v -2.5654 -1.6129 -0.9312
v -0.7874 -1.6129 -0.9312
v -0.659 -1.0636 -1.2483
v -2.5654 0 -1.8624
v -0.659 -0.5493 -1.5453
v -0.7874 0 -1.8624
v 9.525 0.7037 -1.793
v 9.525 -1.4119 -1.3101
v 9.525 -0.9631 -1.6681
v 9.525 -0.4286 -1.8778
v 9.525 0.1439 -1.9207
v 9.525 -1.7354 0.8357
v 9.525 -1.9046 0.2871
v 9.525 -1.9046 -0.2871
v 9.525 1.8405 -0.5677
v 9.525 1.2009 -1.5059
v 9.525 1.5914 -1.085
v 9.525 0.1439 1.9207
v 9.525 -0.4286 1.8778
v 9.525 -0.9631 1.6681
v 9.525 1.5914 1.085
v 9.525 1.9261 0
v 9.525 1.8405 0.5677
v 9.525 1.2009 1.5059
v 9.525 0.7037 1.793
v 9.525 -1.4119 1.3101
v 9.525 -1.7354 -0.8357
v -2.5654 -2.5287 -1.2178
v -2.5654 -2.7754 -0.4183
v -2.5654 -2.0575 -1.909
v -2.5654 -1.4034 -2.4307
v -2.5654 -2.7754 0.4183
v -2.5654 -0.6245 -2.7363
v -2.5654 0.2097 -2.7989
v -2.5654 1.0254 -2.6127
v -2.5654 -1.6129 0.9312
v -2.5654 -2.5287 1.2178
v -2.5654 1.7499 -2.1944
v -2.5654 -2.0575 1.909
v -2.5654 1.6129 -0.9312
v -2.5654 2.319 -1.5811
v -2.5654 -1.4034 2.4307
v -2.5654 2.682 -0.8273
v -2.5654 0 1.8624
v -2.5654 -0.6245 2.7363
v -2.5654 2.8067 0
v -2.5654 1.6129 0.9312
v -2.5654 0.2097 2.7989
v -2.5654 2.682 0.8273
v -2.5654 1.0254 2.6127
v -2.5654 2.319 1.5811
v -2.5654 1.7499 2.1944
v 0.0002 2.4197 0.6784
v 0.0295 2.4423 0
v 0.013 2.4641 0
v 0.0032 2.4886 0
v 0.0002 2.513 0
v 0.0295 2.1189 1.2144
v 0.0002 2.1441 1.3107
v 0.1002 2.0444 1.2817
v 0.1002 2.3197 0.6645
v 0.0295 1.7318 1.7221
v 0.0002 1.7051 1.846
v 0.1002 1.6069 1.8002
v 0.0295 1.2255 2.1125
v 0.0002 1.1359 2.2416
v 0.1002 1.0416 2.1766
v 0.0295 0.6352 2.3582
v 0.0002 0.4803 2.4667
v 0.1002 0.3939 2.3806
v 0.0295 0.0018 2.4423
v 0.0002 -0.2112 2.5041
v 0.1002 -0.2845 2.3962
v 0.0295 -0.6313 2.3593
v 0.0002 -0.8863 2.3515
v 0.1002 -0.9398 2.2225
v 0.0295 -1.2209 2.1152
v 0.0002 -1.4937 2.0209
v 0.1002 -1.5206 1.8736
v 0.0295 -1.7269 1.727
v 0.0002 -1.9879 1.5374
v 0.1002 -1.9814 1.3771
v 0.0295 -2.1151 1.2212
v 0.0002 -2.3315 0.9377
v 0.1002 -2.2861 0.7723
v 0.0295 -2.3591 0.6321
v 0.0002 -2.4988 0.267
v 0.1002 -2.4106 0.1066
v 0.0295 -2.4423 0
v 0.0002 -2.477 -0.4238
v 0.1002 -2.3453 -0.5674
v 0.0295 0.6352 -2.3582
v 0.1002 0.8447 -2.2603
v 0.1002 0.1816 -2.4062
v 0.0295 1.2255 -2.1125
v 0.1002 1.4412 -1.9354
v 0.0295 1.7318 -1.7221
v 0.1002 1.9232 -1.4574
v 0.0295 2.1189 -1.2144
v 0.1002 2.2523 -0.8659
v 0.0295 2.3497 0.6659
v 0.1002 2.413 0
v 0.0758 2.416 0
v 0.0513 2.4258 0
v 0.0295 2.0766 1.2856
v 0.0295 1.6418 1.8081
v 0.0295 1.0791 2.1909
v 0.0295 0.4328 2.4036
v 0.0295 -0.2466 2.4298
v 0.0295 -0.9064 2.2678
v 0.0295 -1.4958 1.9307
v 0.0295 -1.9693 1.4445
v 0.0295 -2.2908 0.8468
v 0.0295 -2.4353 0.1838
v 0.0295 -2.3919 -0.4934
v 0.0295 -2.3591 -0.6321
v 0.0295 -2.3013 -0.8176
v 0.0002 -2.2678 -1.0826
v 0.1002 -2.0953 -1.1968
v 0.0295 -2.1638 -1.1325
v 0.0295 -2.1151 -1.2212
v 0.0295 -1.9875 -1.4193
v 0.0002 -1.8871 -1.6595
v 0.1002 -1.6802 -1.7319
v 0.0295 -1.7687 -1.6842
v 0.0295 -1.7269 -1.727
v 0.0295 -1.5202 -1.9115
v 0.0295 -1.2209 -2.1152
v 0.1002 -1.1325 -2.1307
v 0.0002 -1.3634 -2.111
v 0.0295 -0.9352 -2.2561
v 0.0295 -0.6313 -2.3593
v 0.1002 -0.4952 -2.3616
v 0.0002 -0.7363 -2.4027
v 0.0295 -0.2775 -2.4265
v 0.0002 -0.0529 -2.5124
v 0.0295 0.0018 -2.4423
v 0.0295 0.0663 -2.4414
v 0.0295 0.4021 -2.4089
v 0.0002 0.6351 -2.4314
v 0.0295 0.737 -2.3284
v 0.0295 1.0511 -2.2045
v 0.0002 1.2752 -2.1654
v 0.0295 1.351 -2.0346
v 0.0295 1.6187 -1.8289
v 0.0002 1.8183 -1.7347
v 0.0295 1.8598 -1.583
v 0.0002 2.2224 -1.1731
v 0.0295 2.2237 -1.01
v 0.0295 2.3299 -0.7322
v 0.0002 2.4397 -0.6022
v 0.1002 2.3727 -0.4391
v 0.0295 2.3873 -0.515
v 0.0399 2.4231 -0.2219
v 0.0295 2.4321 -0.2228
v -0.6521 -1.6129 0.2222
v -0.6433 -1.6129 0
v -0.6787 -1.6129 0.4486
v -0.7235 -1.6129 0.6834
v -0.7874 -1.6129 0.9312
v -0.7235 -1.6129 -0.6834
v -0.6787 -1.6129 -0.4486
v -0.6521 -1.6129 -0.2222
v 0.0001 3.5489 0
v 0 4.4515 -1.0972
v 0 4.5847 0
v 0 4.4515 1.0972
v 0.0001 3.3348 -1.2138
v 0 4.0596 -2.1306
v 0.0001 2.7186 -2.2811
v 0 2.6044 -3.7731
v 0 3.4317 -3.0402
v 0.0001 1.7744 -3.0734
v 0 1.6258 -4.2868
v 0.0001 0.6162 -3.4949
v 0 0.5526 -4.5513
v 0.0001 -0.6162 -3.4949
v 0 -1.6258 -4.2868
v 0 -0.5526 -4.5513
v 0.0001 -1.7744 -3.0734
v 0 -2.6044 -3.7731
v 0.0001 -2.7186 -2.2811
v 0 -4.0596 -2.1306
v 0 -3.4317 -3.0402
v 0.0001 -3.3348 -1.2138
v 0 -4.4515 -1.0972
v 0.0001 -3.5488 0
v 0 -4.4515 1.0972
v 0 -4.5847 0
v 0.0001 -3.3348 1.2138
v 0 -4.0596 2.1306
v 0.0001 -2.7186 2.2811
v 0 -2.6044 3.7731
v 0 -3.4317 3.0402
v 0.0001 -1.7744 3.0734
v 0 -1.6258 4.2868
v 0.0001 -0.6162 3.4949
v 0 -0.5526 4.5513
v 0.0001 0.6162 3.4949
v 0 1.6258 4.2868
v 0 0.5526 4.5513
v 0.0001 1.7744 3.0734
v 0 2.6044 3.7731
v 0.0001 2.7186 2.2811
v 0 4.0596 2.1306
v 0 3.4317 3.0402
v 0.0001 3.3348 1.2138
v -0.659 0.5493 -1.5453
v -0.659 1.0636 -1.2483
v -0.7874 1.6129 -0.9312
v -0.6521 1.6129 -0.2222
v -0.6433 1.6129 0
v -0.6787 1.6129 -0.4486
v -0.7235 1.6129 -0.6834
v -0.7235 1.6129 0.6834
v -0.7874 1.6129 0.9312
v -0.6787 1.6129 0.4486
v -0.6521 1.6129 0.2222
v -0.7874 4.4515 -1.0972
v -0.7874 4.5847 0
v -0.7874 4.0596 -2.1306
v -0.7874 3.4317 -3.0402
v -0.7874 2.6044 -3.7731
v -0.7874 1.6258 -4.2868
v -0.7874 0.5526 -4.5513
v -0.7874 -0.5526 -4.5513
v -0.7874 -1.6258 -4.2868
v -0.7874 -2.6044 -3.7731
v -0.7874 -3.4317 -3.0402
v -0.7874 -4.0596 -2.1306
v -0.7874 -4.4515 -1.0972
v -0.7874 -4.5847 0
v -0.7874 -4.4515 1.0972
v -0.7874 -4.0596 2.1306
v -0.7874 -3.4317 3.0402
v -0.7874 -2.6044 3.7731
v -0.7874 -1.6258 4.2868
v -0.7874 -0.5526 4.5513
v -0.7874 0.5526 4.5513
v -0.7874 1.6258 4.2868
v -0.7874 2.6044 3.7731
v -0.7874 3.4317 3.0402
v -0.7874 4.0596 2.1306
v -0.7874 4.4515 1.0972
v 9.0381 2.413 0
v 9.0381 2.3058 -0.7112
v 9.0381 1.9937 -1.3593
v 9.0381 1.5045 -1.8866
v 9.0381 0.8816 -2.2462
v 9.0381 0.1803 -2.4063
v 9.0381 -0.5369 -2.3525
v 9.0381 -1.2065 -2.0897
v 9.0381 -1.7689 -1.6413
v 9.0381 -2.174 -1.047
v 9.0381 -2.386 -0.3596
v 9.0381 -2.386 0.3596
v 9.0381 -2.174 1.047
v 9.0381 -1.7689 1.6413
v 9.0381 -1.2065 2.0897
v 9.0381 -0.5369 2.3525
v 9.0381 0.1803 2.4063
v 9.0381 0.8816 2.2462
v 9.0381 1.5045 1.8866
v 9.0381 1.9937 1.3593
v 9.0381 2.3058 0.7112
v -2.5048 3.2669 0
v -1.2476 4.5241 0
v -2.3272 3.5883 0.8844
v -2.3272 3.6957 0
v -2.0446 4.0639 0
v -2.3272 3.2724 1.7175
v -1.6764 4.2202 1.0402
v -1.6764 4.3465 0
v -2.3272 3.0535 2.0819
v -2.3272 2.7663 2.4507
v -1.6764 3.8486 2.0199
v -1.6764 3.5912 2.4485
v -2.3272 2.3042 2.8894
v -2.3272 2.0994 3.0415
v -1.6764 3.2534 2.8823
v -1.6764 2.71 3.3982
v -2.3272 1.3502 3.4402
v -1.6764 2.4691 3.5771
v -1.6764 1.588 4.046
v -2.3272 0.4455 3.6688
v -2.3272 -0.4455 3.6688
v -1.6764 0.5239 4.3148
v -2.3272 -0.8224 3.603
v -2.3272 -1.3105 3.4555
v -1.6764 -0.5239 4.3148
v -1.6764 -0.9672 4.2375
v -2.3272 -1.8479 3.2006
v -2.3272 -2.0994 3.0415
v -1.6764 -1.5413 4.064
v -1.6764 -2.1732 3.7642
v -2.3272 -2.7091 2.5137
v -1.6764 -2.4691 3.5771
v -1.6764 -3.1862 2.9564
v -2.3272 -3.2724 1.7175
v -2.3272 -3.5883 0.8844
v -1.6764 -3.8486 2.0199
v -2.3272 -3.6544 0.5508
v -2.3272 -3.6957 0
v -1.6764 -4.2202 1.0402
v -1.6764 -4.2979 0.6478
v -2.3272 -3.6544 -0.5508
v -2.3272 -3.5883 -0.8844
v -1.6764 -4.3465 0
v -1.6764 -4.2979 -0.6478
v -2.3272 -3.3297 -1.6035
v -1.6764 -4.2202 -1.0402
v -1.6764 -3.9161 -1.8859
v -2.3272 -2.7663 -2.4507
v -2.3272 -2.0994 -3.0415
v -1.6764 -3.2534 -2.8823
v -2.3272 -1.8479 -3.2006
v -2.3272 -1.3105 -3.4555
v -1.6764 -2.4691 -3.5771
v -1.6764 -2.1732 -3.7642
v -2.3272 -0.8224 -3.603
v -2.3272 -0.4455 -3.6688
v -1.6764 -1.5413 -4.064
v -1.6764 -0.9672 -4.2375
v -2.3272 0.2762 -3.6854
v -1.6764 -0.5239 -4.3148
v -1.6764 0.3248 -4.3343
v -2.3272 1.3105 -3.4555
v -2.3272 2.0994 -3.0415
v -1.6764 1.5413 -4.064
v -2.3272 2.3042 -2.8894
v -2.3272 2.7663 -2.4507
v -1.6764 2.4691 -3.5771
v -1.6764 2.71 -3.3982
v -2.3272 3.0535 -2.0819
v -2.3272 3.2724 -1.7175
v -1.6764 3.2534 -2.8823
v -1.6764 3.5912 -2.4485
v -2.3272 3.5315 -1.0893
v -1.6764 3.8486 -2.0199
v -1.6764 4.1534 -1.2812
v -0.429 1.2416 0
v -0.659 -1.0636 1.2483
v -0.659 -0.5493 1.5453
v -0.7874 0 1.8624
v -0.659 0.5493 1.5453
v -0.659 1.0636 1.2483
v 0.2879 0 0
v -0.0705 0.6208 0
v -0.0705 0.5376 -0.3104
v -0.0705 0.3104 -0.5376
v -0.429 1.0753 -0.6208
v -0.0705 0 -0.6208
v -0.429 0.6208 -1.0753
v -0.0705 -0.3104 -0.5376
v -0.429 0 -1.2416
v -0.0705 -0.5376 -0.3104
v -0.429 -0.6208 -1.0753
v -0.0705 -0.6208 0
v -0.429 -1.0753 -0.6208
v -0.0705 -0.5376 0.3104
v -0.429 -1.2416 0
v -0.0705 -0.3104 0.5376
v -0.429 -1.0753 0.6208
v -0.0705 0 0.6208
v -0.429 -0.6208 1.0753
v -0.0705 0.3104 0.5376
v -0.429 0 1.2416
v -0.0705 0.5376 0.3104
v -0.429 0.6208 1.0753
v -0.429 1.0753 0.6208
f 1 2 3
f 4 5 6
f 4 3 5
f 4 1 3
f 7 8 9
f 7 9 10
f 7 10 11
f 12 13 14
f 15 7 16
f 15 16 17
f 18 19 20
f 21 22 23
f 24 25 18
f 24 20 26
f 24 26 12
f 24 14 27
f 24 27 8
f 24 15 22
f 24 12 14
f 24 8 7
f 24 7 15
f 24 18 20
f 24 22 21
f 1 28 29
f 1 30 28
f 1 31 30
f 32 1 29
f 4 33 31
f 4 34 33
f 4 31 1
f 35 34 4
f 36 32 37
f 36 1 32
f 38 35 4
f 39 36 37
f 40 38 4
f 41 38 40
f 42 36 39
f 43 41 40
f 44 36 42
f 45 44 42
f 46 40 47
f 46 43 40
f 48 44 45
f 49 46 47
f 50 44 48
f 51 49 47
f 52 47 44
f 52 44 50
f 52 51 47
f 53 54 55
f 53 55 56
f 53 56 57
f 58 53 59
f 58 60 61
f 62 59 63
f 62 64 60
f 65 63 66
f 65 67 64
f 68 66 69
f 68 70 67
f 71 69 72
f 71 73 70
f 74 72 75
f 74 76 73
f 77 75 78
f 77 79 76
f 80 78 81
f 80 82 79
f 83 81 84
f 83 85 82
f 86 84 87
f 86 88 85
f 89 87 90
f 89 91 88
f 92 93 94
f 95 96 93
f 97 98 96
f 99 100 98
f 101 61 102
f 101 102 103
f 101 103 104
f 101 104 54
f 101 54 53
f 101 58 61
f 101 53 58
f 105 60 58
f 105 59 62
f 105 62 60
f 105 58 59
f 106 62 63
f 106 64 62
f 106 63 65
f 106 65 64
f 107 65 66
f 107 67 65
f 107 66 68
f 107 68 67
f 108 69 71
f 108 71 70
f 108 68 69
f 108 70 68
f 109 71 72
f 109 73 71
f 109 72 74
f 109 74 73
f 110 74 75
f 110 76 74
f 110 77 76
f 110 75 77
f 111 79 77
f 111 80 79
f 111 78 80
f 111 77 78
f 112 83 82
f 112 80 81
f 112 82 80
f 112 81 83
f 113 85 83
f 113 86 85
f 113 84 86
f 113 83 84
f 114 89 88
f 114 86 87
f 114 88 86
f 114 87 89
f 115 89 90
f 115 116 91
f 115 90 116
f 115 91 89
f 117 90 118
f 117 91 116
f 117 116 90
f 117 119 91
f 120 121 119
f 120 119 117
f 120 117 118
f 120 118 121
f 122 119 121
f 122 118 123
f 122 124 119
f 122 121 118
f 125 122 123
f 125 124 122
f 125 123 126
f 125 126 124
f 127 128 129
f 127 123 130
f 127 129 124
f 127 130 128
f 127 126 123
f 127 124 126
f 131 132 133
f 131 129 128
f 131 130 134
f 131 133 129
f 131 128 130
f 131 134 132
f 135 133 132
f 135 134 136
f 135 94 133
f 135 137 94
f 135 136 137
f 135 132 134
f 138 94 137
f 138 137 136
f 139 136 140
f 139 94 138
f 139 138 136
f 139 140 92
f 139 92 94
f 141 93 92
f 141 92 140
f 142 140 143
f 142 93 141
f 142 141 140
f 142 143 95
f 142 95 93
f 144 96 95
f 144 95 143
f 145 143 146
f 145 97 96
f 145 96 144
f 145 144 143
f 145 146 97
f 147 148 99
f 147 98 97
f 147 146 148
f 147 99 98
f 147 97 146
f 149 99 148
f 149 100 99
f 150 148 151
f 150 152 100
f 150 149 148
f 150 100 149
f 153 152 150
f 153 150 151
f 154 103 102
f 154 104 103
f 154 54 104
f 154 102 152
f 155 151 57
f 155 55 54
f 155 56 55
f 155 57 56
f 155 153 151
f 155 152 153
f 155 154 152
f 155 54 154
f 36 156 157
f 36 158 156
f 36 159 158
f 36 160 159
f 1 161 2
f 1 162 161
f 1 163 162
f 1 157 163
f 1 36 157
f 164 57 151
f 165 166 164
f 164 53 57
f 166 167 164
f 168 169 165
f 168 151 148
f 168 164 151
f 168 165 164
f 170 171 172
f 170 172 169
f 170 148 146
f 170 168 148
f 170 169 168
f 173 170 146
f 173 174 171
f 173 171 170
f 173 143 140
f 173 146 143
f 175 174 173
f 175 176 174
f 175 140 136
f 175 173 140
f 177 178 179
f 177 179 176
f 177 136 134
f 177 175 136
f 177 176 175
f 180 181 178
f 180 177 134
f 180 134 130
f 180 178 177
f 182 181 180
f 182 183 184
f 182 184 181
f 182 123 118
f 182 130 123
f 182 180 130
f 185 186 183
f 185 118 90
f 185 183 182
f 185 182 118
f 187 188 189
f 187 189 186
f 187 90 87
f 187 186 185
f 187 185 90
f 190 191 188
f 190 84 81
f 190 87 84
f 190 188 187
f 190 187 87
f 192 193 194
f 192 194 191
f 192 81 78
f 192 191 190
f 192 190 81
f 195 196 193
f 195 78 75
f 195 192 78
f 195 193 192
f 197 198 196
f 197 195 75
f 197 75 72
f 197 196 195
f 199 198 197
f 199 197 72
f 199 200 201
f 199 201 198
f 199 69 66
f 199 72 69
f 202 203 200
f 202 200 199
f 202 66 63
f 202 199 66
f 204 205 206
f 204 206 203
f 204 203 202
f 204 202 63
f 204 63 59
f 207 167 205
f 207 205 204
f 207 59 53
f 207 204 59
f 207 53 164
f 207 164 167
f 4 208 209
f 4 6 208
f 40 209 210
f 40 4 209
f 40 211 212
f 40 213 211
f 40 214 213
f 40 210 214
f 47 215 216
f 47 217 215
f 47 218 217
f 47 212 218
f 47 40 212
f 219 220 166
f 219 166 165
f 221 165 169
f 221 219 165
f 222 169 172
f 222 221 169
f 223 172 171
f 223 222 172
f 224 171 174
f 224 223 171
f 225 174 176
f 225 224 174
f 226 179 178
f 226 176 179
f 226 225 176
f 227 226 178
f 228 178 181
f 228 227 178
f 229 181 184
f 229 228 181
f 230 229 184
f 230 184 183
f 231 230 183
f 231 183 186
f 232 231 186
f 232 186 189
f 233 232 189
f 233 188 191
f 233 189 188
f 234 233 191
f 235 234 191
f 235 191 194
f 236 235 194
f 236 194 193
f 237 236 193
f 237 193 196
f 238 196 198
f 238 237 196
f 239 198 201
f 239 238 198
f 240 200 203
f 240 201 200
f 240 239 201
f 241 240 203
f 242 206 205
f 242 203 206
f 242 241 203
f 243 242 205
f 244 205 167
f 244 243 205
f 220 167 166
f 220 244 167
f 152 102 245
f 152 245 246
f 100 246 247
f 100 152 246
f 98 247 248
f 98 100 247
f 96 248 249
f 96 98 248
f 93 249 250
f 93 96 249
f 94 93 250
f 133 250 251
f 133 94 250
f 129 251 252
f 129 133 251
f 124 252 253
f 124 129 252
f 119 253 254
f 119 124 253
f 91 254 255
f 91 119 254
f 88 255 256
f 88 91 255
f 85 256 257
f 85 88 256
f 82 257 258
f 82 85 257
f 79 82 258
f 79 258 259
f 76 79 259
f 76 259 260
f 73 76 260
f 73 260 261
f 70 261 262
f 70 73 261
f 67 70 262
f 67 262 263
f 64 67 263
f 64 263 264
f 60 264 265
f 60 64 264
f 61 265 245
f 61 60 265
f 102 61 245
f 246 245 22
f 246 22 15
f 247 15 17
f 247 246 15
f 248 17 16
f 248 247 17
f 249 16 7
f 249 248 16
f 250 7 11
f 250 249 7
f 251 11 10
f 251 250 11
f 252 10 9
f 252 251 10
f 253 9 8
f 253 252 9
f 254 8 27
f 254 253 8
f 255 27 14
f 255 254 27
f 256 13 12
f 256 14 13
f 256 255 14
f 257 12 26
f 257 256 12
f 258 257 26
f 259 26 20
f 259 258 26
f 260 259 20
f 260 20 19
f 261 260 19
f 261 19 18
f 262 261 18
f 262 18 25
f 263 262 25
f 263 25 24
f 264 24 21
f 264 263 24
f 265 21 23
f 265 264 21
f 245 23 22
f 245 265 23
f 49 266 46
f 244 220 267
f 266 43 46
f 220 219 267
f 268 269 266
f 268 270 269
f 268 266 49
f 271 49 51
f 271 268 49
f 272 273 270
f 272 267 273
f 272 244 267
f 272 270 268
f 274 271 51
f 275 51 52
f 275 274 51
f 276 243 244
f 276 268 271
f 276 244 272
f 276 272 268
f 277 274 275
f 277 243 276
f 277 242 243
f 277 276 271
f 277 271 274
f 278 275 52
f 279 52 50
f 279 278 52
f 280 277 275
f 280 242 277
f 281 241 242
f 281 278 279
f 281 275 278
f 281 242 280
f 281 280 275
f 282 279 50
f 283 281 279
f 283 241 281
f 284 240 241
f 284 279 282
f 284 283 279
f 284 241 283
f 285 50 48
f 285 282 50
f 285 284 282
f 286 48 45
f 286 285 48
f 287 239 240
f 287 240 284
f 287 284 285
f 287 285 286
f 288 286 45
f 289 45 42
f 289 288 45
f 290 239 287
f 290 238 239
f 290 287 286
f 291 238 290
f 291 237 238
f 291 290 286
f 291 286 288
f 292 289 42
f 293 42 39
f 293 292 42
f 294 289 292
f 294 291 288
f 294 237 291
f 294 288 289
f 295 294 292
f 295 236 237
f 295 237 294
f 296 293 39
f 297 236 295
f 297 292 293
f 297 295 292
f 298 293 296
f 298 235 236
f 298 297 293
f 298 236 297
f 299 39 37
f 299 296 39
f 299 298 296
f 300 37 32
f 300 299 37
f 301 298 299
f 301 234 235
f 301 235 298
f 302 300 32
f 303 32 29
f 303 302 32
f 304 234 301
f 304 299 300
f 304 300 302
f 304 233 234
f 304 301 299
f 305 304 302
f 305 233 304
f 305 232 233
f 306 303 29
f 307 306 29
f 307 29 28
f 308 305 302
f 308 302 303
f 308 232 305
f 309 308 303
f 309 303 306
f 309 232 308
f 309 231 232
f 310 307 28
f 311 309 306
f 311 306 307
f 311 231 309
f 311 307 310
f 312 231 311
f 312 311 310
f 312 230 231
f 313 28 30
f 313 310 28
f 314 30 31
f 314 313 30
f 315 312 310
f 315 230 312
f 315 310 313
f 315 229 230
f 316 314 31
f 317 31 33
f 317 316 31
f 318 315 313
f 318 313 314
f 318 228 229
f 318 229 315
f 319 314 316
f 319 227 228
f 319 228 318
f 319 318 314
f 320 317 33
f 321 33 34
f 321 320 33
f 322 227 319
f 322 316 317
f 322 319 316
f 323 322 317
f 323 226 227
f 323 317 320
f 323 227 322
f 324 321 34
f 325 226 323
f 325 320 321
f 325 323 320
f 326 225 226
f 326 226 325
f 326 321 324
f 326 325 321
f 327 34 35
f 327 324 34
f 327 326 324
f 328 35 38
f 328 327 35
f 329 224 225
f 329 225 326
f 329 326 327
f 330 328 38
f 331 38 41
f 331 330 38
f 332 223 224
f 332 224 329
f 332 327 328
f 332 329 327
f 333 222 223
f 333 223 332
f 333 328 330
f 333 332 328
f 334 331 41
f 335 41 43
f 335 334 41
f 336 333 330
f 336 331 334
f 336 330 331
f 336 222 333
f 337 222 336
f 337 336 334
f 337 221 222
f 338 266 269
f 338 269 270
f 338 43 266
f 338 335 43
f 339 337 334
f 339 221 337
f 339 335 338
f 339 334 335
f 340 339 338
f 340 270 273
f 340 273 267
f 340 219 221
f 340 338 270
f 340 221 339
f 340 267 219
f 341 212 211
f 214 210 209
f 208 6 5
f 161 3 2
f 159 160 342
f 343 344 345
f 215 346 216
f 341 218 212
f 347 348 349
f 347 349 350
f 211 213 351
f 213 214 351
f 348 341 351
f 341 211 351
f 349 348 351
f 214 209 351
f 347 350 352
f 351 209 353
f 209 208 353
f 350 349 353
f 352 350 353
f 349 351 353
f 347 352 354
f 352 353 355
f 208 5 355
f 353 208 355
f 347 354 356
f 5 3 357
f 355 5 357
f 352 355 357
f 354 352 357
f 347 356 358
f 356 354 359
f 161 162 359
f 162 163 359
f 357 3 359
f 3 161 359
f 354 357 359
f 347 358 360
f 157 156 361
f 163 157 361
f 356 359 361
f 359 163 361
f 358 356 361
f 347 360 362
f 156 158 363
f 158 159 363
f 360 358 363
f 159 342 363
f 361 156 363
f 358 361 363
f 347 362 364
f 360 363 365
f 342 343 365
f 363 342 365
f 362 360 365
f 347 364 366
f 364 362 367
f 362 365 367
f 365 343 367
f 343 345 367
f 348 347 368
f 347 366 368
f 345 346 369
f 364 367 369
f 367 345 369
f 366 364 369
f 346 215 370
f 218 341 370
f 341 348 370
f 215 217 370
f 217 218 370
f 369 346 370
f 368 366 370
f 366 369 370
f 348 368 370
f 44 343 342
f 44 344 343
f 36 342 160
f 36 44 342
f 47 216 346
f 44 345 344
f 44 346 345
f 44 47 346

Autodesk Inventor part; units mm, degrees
ref_plane "YZ Plane" through (0, 0, 0) normal (1, 0, 0) x (0, 1, 0)
ref_plane "XZ Plane" through (0, 0, 0) normal (0, 1, 0) x (-1, 0, 0)
sketch "Sketch1" plane through (0, 0, 0) normal (0, 0, 1) x (1, 0, 0)
  line L0 (0.2879, 0) -> (9.525, 0)
  line L1 (9.525, 0) -> (9.525, 2.413)
  line L2 (9.525, 2.413) -> (1.5878, 2.413)
  line L3 (1.5878, 2.413) -> (0.0002, 2.413)
  line L4 (0.0002, 2.413) -> (0, 2.413)
  line L5 (0, 2.413) -> (0, 4.5847)
  line L6 (0, 4.5847) -> (-2.5654, 4.5847)
  line L7 (-2.5654, 4.5847) -> (-2.5654, 1.8624)
  line L8 (-2.5654, 1.8624) -> (-0.7874, 1.8624)
  line L9 (-0.7874, 1.8624) -> (0.2879, 0)
  line L10 (-4.9835, 0) -> (11.9431, 0) projected
  line L11 (0, -0.9169) -> (0, 5.5016) projected
  line L12 (1.5878, 2.413) -> (0, 2.413) construction
  dimension "d1" = 7.9372
  dimension "d2" = 1.5876
  dimension "d3" = 2.5654
  dimension "d4" = 1.778
  dimension "d5" = 60
  dimension "d6" = 4.826
  dimension "d7" = 4.826
  dimension "d8" = 3.7248
  dimension "d9" = 9.1694
  dimension "d26" = 9.525
revolve "Body" add sketch "Sketch1" angle 360 about axis through (0.2879, 0, 0) along (1, 0, 0) contours L9 L11 L3 L2 L1 L0 | L9 L8 L7 L6 L5 L11
sketch "Sketch2" plane through (-2.5654, 0, 0) normal (-1, 0, 0) x (0, 0, 1)
  circle A0 centre (0, 0) radius 1.8624 projected
  line L0 (0, -6.4186) -> (0, 6.4186) projected
  line L1 (-6.4186, 0) -> (6.4186, 0) projected
  line L2 (1.8624, 0) -> (0.9312, -1.6129)
  line L3 (0.9312, -1.6129) -> (-0.9312, -1.6129)
  line L4 (-0.9312, -1.6129) -> (-1.8624, 0)
  line L5 (-1.8624, 0) -> (-0.9312, 1.6129)
  line L6 (-0.9312, 1.6129) -> (0.9312, 1.6129)
  line L7 (0.9312, 1.6129) -> (1.8624, 0)
extrude "Slot" add sketch "Sketch2" against normal up to next contours L7 A0 | A0 L2 | L6 L0 A0 | A0 L0 L3 | L0 L6 A0 | A0 L3 L0 | L4 A0 | A0 L5
fillet "Fillet1" radius 1.778 1 edges at (-2.5654, -4.5847, 0)
thread "Thread" size "10-32 UNF" class "2A" standard "ANSI Unified Screw Threads" length 7.9372
chamfer "Chamfer1" distance 0.4869 distance2 0.4869 1 edges at (9.525, -2.413, 0) measured on face at (9.525, -0.2686, 0.7084)
ref_plane "Work Plane1" through (29, 0, 0) normal (0, -1, 0) x (1, 0, 0)
fillet "Fillet2" radius 0.1 1 edges at (0.0002, -2.413, 0)
equation "\"d30\" = R"
equation "\"d17\" = RR"
equation "\"d13\" = GEL"
equation "\"d15\" = -0.5 * SPD + 0.5 * GD"
equation "\"d16\" = GUL"
equation "\"d1\" = GEL"
equation "\"d3\" = KOH"
equation "\"d4\" = INTI"
equation "\"d6\" = GD"
equation "\"d7\" = BDM"
equation "\"d8\" = 1.1547 * SW"
equation "\"d9\" = KOD"
equation "\"d26\" = NLG"
equation "\"GD\" = NND"
equation "\"NLG\" = 9.525"
equation "\"GEL\" = 7.93725"
equation "\"KOD\" = 9.1694"
equation "\"KOH\" = 2.5654"
equation "\"INTI\" = 1.778"
equation "\"GAL\" = 1.5875"
equation "\"GUL\" = 0.48692"
equation "\"BDM\" = NND"
equation "\"SW\" = 3.2258"
equation "\"RR\" = 1.778"
equation "\"SPD\" = GD1"
equation "\"R\" = 0.1"
equation "\"KR\" = 4.699"
equation "\"GD1\" = 3.85216"
equation "\"THREADDIA\" = 4.826"
equation "\"FAWI\" = 45deg"
equation "\"KOH1\" = 1.778"
equation "\"NND\" = 4.826"
equation "\"TOA\" = 30deg"
equation "\"E0\" = 1.155 * SW"
properties part number "Unbrako - 10 x 3/8" material "Steel, Mild"
